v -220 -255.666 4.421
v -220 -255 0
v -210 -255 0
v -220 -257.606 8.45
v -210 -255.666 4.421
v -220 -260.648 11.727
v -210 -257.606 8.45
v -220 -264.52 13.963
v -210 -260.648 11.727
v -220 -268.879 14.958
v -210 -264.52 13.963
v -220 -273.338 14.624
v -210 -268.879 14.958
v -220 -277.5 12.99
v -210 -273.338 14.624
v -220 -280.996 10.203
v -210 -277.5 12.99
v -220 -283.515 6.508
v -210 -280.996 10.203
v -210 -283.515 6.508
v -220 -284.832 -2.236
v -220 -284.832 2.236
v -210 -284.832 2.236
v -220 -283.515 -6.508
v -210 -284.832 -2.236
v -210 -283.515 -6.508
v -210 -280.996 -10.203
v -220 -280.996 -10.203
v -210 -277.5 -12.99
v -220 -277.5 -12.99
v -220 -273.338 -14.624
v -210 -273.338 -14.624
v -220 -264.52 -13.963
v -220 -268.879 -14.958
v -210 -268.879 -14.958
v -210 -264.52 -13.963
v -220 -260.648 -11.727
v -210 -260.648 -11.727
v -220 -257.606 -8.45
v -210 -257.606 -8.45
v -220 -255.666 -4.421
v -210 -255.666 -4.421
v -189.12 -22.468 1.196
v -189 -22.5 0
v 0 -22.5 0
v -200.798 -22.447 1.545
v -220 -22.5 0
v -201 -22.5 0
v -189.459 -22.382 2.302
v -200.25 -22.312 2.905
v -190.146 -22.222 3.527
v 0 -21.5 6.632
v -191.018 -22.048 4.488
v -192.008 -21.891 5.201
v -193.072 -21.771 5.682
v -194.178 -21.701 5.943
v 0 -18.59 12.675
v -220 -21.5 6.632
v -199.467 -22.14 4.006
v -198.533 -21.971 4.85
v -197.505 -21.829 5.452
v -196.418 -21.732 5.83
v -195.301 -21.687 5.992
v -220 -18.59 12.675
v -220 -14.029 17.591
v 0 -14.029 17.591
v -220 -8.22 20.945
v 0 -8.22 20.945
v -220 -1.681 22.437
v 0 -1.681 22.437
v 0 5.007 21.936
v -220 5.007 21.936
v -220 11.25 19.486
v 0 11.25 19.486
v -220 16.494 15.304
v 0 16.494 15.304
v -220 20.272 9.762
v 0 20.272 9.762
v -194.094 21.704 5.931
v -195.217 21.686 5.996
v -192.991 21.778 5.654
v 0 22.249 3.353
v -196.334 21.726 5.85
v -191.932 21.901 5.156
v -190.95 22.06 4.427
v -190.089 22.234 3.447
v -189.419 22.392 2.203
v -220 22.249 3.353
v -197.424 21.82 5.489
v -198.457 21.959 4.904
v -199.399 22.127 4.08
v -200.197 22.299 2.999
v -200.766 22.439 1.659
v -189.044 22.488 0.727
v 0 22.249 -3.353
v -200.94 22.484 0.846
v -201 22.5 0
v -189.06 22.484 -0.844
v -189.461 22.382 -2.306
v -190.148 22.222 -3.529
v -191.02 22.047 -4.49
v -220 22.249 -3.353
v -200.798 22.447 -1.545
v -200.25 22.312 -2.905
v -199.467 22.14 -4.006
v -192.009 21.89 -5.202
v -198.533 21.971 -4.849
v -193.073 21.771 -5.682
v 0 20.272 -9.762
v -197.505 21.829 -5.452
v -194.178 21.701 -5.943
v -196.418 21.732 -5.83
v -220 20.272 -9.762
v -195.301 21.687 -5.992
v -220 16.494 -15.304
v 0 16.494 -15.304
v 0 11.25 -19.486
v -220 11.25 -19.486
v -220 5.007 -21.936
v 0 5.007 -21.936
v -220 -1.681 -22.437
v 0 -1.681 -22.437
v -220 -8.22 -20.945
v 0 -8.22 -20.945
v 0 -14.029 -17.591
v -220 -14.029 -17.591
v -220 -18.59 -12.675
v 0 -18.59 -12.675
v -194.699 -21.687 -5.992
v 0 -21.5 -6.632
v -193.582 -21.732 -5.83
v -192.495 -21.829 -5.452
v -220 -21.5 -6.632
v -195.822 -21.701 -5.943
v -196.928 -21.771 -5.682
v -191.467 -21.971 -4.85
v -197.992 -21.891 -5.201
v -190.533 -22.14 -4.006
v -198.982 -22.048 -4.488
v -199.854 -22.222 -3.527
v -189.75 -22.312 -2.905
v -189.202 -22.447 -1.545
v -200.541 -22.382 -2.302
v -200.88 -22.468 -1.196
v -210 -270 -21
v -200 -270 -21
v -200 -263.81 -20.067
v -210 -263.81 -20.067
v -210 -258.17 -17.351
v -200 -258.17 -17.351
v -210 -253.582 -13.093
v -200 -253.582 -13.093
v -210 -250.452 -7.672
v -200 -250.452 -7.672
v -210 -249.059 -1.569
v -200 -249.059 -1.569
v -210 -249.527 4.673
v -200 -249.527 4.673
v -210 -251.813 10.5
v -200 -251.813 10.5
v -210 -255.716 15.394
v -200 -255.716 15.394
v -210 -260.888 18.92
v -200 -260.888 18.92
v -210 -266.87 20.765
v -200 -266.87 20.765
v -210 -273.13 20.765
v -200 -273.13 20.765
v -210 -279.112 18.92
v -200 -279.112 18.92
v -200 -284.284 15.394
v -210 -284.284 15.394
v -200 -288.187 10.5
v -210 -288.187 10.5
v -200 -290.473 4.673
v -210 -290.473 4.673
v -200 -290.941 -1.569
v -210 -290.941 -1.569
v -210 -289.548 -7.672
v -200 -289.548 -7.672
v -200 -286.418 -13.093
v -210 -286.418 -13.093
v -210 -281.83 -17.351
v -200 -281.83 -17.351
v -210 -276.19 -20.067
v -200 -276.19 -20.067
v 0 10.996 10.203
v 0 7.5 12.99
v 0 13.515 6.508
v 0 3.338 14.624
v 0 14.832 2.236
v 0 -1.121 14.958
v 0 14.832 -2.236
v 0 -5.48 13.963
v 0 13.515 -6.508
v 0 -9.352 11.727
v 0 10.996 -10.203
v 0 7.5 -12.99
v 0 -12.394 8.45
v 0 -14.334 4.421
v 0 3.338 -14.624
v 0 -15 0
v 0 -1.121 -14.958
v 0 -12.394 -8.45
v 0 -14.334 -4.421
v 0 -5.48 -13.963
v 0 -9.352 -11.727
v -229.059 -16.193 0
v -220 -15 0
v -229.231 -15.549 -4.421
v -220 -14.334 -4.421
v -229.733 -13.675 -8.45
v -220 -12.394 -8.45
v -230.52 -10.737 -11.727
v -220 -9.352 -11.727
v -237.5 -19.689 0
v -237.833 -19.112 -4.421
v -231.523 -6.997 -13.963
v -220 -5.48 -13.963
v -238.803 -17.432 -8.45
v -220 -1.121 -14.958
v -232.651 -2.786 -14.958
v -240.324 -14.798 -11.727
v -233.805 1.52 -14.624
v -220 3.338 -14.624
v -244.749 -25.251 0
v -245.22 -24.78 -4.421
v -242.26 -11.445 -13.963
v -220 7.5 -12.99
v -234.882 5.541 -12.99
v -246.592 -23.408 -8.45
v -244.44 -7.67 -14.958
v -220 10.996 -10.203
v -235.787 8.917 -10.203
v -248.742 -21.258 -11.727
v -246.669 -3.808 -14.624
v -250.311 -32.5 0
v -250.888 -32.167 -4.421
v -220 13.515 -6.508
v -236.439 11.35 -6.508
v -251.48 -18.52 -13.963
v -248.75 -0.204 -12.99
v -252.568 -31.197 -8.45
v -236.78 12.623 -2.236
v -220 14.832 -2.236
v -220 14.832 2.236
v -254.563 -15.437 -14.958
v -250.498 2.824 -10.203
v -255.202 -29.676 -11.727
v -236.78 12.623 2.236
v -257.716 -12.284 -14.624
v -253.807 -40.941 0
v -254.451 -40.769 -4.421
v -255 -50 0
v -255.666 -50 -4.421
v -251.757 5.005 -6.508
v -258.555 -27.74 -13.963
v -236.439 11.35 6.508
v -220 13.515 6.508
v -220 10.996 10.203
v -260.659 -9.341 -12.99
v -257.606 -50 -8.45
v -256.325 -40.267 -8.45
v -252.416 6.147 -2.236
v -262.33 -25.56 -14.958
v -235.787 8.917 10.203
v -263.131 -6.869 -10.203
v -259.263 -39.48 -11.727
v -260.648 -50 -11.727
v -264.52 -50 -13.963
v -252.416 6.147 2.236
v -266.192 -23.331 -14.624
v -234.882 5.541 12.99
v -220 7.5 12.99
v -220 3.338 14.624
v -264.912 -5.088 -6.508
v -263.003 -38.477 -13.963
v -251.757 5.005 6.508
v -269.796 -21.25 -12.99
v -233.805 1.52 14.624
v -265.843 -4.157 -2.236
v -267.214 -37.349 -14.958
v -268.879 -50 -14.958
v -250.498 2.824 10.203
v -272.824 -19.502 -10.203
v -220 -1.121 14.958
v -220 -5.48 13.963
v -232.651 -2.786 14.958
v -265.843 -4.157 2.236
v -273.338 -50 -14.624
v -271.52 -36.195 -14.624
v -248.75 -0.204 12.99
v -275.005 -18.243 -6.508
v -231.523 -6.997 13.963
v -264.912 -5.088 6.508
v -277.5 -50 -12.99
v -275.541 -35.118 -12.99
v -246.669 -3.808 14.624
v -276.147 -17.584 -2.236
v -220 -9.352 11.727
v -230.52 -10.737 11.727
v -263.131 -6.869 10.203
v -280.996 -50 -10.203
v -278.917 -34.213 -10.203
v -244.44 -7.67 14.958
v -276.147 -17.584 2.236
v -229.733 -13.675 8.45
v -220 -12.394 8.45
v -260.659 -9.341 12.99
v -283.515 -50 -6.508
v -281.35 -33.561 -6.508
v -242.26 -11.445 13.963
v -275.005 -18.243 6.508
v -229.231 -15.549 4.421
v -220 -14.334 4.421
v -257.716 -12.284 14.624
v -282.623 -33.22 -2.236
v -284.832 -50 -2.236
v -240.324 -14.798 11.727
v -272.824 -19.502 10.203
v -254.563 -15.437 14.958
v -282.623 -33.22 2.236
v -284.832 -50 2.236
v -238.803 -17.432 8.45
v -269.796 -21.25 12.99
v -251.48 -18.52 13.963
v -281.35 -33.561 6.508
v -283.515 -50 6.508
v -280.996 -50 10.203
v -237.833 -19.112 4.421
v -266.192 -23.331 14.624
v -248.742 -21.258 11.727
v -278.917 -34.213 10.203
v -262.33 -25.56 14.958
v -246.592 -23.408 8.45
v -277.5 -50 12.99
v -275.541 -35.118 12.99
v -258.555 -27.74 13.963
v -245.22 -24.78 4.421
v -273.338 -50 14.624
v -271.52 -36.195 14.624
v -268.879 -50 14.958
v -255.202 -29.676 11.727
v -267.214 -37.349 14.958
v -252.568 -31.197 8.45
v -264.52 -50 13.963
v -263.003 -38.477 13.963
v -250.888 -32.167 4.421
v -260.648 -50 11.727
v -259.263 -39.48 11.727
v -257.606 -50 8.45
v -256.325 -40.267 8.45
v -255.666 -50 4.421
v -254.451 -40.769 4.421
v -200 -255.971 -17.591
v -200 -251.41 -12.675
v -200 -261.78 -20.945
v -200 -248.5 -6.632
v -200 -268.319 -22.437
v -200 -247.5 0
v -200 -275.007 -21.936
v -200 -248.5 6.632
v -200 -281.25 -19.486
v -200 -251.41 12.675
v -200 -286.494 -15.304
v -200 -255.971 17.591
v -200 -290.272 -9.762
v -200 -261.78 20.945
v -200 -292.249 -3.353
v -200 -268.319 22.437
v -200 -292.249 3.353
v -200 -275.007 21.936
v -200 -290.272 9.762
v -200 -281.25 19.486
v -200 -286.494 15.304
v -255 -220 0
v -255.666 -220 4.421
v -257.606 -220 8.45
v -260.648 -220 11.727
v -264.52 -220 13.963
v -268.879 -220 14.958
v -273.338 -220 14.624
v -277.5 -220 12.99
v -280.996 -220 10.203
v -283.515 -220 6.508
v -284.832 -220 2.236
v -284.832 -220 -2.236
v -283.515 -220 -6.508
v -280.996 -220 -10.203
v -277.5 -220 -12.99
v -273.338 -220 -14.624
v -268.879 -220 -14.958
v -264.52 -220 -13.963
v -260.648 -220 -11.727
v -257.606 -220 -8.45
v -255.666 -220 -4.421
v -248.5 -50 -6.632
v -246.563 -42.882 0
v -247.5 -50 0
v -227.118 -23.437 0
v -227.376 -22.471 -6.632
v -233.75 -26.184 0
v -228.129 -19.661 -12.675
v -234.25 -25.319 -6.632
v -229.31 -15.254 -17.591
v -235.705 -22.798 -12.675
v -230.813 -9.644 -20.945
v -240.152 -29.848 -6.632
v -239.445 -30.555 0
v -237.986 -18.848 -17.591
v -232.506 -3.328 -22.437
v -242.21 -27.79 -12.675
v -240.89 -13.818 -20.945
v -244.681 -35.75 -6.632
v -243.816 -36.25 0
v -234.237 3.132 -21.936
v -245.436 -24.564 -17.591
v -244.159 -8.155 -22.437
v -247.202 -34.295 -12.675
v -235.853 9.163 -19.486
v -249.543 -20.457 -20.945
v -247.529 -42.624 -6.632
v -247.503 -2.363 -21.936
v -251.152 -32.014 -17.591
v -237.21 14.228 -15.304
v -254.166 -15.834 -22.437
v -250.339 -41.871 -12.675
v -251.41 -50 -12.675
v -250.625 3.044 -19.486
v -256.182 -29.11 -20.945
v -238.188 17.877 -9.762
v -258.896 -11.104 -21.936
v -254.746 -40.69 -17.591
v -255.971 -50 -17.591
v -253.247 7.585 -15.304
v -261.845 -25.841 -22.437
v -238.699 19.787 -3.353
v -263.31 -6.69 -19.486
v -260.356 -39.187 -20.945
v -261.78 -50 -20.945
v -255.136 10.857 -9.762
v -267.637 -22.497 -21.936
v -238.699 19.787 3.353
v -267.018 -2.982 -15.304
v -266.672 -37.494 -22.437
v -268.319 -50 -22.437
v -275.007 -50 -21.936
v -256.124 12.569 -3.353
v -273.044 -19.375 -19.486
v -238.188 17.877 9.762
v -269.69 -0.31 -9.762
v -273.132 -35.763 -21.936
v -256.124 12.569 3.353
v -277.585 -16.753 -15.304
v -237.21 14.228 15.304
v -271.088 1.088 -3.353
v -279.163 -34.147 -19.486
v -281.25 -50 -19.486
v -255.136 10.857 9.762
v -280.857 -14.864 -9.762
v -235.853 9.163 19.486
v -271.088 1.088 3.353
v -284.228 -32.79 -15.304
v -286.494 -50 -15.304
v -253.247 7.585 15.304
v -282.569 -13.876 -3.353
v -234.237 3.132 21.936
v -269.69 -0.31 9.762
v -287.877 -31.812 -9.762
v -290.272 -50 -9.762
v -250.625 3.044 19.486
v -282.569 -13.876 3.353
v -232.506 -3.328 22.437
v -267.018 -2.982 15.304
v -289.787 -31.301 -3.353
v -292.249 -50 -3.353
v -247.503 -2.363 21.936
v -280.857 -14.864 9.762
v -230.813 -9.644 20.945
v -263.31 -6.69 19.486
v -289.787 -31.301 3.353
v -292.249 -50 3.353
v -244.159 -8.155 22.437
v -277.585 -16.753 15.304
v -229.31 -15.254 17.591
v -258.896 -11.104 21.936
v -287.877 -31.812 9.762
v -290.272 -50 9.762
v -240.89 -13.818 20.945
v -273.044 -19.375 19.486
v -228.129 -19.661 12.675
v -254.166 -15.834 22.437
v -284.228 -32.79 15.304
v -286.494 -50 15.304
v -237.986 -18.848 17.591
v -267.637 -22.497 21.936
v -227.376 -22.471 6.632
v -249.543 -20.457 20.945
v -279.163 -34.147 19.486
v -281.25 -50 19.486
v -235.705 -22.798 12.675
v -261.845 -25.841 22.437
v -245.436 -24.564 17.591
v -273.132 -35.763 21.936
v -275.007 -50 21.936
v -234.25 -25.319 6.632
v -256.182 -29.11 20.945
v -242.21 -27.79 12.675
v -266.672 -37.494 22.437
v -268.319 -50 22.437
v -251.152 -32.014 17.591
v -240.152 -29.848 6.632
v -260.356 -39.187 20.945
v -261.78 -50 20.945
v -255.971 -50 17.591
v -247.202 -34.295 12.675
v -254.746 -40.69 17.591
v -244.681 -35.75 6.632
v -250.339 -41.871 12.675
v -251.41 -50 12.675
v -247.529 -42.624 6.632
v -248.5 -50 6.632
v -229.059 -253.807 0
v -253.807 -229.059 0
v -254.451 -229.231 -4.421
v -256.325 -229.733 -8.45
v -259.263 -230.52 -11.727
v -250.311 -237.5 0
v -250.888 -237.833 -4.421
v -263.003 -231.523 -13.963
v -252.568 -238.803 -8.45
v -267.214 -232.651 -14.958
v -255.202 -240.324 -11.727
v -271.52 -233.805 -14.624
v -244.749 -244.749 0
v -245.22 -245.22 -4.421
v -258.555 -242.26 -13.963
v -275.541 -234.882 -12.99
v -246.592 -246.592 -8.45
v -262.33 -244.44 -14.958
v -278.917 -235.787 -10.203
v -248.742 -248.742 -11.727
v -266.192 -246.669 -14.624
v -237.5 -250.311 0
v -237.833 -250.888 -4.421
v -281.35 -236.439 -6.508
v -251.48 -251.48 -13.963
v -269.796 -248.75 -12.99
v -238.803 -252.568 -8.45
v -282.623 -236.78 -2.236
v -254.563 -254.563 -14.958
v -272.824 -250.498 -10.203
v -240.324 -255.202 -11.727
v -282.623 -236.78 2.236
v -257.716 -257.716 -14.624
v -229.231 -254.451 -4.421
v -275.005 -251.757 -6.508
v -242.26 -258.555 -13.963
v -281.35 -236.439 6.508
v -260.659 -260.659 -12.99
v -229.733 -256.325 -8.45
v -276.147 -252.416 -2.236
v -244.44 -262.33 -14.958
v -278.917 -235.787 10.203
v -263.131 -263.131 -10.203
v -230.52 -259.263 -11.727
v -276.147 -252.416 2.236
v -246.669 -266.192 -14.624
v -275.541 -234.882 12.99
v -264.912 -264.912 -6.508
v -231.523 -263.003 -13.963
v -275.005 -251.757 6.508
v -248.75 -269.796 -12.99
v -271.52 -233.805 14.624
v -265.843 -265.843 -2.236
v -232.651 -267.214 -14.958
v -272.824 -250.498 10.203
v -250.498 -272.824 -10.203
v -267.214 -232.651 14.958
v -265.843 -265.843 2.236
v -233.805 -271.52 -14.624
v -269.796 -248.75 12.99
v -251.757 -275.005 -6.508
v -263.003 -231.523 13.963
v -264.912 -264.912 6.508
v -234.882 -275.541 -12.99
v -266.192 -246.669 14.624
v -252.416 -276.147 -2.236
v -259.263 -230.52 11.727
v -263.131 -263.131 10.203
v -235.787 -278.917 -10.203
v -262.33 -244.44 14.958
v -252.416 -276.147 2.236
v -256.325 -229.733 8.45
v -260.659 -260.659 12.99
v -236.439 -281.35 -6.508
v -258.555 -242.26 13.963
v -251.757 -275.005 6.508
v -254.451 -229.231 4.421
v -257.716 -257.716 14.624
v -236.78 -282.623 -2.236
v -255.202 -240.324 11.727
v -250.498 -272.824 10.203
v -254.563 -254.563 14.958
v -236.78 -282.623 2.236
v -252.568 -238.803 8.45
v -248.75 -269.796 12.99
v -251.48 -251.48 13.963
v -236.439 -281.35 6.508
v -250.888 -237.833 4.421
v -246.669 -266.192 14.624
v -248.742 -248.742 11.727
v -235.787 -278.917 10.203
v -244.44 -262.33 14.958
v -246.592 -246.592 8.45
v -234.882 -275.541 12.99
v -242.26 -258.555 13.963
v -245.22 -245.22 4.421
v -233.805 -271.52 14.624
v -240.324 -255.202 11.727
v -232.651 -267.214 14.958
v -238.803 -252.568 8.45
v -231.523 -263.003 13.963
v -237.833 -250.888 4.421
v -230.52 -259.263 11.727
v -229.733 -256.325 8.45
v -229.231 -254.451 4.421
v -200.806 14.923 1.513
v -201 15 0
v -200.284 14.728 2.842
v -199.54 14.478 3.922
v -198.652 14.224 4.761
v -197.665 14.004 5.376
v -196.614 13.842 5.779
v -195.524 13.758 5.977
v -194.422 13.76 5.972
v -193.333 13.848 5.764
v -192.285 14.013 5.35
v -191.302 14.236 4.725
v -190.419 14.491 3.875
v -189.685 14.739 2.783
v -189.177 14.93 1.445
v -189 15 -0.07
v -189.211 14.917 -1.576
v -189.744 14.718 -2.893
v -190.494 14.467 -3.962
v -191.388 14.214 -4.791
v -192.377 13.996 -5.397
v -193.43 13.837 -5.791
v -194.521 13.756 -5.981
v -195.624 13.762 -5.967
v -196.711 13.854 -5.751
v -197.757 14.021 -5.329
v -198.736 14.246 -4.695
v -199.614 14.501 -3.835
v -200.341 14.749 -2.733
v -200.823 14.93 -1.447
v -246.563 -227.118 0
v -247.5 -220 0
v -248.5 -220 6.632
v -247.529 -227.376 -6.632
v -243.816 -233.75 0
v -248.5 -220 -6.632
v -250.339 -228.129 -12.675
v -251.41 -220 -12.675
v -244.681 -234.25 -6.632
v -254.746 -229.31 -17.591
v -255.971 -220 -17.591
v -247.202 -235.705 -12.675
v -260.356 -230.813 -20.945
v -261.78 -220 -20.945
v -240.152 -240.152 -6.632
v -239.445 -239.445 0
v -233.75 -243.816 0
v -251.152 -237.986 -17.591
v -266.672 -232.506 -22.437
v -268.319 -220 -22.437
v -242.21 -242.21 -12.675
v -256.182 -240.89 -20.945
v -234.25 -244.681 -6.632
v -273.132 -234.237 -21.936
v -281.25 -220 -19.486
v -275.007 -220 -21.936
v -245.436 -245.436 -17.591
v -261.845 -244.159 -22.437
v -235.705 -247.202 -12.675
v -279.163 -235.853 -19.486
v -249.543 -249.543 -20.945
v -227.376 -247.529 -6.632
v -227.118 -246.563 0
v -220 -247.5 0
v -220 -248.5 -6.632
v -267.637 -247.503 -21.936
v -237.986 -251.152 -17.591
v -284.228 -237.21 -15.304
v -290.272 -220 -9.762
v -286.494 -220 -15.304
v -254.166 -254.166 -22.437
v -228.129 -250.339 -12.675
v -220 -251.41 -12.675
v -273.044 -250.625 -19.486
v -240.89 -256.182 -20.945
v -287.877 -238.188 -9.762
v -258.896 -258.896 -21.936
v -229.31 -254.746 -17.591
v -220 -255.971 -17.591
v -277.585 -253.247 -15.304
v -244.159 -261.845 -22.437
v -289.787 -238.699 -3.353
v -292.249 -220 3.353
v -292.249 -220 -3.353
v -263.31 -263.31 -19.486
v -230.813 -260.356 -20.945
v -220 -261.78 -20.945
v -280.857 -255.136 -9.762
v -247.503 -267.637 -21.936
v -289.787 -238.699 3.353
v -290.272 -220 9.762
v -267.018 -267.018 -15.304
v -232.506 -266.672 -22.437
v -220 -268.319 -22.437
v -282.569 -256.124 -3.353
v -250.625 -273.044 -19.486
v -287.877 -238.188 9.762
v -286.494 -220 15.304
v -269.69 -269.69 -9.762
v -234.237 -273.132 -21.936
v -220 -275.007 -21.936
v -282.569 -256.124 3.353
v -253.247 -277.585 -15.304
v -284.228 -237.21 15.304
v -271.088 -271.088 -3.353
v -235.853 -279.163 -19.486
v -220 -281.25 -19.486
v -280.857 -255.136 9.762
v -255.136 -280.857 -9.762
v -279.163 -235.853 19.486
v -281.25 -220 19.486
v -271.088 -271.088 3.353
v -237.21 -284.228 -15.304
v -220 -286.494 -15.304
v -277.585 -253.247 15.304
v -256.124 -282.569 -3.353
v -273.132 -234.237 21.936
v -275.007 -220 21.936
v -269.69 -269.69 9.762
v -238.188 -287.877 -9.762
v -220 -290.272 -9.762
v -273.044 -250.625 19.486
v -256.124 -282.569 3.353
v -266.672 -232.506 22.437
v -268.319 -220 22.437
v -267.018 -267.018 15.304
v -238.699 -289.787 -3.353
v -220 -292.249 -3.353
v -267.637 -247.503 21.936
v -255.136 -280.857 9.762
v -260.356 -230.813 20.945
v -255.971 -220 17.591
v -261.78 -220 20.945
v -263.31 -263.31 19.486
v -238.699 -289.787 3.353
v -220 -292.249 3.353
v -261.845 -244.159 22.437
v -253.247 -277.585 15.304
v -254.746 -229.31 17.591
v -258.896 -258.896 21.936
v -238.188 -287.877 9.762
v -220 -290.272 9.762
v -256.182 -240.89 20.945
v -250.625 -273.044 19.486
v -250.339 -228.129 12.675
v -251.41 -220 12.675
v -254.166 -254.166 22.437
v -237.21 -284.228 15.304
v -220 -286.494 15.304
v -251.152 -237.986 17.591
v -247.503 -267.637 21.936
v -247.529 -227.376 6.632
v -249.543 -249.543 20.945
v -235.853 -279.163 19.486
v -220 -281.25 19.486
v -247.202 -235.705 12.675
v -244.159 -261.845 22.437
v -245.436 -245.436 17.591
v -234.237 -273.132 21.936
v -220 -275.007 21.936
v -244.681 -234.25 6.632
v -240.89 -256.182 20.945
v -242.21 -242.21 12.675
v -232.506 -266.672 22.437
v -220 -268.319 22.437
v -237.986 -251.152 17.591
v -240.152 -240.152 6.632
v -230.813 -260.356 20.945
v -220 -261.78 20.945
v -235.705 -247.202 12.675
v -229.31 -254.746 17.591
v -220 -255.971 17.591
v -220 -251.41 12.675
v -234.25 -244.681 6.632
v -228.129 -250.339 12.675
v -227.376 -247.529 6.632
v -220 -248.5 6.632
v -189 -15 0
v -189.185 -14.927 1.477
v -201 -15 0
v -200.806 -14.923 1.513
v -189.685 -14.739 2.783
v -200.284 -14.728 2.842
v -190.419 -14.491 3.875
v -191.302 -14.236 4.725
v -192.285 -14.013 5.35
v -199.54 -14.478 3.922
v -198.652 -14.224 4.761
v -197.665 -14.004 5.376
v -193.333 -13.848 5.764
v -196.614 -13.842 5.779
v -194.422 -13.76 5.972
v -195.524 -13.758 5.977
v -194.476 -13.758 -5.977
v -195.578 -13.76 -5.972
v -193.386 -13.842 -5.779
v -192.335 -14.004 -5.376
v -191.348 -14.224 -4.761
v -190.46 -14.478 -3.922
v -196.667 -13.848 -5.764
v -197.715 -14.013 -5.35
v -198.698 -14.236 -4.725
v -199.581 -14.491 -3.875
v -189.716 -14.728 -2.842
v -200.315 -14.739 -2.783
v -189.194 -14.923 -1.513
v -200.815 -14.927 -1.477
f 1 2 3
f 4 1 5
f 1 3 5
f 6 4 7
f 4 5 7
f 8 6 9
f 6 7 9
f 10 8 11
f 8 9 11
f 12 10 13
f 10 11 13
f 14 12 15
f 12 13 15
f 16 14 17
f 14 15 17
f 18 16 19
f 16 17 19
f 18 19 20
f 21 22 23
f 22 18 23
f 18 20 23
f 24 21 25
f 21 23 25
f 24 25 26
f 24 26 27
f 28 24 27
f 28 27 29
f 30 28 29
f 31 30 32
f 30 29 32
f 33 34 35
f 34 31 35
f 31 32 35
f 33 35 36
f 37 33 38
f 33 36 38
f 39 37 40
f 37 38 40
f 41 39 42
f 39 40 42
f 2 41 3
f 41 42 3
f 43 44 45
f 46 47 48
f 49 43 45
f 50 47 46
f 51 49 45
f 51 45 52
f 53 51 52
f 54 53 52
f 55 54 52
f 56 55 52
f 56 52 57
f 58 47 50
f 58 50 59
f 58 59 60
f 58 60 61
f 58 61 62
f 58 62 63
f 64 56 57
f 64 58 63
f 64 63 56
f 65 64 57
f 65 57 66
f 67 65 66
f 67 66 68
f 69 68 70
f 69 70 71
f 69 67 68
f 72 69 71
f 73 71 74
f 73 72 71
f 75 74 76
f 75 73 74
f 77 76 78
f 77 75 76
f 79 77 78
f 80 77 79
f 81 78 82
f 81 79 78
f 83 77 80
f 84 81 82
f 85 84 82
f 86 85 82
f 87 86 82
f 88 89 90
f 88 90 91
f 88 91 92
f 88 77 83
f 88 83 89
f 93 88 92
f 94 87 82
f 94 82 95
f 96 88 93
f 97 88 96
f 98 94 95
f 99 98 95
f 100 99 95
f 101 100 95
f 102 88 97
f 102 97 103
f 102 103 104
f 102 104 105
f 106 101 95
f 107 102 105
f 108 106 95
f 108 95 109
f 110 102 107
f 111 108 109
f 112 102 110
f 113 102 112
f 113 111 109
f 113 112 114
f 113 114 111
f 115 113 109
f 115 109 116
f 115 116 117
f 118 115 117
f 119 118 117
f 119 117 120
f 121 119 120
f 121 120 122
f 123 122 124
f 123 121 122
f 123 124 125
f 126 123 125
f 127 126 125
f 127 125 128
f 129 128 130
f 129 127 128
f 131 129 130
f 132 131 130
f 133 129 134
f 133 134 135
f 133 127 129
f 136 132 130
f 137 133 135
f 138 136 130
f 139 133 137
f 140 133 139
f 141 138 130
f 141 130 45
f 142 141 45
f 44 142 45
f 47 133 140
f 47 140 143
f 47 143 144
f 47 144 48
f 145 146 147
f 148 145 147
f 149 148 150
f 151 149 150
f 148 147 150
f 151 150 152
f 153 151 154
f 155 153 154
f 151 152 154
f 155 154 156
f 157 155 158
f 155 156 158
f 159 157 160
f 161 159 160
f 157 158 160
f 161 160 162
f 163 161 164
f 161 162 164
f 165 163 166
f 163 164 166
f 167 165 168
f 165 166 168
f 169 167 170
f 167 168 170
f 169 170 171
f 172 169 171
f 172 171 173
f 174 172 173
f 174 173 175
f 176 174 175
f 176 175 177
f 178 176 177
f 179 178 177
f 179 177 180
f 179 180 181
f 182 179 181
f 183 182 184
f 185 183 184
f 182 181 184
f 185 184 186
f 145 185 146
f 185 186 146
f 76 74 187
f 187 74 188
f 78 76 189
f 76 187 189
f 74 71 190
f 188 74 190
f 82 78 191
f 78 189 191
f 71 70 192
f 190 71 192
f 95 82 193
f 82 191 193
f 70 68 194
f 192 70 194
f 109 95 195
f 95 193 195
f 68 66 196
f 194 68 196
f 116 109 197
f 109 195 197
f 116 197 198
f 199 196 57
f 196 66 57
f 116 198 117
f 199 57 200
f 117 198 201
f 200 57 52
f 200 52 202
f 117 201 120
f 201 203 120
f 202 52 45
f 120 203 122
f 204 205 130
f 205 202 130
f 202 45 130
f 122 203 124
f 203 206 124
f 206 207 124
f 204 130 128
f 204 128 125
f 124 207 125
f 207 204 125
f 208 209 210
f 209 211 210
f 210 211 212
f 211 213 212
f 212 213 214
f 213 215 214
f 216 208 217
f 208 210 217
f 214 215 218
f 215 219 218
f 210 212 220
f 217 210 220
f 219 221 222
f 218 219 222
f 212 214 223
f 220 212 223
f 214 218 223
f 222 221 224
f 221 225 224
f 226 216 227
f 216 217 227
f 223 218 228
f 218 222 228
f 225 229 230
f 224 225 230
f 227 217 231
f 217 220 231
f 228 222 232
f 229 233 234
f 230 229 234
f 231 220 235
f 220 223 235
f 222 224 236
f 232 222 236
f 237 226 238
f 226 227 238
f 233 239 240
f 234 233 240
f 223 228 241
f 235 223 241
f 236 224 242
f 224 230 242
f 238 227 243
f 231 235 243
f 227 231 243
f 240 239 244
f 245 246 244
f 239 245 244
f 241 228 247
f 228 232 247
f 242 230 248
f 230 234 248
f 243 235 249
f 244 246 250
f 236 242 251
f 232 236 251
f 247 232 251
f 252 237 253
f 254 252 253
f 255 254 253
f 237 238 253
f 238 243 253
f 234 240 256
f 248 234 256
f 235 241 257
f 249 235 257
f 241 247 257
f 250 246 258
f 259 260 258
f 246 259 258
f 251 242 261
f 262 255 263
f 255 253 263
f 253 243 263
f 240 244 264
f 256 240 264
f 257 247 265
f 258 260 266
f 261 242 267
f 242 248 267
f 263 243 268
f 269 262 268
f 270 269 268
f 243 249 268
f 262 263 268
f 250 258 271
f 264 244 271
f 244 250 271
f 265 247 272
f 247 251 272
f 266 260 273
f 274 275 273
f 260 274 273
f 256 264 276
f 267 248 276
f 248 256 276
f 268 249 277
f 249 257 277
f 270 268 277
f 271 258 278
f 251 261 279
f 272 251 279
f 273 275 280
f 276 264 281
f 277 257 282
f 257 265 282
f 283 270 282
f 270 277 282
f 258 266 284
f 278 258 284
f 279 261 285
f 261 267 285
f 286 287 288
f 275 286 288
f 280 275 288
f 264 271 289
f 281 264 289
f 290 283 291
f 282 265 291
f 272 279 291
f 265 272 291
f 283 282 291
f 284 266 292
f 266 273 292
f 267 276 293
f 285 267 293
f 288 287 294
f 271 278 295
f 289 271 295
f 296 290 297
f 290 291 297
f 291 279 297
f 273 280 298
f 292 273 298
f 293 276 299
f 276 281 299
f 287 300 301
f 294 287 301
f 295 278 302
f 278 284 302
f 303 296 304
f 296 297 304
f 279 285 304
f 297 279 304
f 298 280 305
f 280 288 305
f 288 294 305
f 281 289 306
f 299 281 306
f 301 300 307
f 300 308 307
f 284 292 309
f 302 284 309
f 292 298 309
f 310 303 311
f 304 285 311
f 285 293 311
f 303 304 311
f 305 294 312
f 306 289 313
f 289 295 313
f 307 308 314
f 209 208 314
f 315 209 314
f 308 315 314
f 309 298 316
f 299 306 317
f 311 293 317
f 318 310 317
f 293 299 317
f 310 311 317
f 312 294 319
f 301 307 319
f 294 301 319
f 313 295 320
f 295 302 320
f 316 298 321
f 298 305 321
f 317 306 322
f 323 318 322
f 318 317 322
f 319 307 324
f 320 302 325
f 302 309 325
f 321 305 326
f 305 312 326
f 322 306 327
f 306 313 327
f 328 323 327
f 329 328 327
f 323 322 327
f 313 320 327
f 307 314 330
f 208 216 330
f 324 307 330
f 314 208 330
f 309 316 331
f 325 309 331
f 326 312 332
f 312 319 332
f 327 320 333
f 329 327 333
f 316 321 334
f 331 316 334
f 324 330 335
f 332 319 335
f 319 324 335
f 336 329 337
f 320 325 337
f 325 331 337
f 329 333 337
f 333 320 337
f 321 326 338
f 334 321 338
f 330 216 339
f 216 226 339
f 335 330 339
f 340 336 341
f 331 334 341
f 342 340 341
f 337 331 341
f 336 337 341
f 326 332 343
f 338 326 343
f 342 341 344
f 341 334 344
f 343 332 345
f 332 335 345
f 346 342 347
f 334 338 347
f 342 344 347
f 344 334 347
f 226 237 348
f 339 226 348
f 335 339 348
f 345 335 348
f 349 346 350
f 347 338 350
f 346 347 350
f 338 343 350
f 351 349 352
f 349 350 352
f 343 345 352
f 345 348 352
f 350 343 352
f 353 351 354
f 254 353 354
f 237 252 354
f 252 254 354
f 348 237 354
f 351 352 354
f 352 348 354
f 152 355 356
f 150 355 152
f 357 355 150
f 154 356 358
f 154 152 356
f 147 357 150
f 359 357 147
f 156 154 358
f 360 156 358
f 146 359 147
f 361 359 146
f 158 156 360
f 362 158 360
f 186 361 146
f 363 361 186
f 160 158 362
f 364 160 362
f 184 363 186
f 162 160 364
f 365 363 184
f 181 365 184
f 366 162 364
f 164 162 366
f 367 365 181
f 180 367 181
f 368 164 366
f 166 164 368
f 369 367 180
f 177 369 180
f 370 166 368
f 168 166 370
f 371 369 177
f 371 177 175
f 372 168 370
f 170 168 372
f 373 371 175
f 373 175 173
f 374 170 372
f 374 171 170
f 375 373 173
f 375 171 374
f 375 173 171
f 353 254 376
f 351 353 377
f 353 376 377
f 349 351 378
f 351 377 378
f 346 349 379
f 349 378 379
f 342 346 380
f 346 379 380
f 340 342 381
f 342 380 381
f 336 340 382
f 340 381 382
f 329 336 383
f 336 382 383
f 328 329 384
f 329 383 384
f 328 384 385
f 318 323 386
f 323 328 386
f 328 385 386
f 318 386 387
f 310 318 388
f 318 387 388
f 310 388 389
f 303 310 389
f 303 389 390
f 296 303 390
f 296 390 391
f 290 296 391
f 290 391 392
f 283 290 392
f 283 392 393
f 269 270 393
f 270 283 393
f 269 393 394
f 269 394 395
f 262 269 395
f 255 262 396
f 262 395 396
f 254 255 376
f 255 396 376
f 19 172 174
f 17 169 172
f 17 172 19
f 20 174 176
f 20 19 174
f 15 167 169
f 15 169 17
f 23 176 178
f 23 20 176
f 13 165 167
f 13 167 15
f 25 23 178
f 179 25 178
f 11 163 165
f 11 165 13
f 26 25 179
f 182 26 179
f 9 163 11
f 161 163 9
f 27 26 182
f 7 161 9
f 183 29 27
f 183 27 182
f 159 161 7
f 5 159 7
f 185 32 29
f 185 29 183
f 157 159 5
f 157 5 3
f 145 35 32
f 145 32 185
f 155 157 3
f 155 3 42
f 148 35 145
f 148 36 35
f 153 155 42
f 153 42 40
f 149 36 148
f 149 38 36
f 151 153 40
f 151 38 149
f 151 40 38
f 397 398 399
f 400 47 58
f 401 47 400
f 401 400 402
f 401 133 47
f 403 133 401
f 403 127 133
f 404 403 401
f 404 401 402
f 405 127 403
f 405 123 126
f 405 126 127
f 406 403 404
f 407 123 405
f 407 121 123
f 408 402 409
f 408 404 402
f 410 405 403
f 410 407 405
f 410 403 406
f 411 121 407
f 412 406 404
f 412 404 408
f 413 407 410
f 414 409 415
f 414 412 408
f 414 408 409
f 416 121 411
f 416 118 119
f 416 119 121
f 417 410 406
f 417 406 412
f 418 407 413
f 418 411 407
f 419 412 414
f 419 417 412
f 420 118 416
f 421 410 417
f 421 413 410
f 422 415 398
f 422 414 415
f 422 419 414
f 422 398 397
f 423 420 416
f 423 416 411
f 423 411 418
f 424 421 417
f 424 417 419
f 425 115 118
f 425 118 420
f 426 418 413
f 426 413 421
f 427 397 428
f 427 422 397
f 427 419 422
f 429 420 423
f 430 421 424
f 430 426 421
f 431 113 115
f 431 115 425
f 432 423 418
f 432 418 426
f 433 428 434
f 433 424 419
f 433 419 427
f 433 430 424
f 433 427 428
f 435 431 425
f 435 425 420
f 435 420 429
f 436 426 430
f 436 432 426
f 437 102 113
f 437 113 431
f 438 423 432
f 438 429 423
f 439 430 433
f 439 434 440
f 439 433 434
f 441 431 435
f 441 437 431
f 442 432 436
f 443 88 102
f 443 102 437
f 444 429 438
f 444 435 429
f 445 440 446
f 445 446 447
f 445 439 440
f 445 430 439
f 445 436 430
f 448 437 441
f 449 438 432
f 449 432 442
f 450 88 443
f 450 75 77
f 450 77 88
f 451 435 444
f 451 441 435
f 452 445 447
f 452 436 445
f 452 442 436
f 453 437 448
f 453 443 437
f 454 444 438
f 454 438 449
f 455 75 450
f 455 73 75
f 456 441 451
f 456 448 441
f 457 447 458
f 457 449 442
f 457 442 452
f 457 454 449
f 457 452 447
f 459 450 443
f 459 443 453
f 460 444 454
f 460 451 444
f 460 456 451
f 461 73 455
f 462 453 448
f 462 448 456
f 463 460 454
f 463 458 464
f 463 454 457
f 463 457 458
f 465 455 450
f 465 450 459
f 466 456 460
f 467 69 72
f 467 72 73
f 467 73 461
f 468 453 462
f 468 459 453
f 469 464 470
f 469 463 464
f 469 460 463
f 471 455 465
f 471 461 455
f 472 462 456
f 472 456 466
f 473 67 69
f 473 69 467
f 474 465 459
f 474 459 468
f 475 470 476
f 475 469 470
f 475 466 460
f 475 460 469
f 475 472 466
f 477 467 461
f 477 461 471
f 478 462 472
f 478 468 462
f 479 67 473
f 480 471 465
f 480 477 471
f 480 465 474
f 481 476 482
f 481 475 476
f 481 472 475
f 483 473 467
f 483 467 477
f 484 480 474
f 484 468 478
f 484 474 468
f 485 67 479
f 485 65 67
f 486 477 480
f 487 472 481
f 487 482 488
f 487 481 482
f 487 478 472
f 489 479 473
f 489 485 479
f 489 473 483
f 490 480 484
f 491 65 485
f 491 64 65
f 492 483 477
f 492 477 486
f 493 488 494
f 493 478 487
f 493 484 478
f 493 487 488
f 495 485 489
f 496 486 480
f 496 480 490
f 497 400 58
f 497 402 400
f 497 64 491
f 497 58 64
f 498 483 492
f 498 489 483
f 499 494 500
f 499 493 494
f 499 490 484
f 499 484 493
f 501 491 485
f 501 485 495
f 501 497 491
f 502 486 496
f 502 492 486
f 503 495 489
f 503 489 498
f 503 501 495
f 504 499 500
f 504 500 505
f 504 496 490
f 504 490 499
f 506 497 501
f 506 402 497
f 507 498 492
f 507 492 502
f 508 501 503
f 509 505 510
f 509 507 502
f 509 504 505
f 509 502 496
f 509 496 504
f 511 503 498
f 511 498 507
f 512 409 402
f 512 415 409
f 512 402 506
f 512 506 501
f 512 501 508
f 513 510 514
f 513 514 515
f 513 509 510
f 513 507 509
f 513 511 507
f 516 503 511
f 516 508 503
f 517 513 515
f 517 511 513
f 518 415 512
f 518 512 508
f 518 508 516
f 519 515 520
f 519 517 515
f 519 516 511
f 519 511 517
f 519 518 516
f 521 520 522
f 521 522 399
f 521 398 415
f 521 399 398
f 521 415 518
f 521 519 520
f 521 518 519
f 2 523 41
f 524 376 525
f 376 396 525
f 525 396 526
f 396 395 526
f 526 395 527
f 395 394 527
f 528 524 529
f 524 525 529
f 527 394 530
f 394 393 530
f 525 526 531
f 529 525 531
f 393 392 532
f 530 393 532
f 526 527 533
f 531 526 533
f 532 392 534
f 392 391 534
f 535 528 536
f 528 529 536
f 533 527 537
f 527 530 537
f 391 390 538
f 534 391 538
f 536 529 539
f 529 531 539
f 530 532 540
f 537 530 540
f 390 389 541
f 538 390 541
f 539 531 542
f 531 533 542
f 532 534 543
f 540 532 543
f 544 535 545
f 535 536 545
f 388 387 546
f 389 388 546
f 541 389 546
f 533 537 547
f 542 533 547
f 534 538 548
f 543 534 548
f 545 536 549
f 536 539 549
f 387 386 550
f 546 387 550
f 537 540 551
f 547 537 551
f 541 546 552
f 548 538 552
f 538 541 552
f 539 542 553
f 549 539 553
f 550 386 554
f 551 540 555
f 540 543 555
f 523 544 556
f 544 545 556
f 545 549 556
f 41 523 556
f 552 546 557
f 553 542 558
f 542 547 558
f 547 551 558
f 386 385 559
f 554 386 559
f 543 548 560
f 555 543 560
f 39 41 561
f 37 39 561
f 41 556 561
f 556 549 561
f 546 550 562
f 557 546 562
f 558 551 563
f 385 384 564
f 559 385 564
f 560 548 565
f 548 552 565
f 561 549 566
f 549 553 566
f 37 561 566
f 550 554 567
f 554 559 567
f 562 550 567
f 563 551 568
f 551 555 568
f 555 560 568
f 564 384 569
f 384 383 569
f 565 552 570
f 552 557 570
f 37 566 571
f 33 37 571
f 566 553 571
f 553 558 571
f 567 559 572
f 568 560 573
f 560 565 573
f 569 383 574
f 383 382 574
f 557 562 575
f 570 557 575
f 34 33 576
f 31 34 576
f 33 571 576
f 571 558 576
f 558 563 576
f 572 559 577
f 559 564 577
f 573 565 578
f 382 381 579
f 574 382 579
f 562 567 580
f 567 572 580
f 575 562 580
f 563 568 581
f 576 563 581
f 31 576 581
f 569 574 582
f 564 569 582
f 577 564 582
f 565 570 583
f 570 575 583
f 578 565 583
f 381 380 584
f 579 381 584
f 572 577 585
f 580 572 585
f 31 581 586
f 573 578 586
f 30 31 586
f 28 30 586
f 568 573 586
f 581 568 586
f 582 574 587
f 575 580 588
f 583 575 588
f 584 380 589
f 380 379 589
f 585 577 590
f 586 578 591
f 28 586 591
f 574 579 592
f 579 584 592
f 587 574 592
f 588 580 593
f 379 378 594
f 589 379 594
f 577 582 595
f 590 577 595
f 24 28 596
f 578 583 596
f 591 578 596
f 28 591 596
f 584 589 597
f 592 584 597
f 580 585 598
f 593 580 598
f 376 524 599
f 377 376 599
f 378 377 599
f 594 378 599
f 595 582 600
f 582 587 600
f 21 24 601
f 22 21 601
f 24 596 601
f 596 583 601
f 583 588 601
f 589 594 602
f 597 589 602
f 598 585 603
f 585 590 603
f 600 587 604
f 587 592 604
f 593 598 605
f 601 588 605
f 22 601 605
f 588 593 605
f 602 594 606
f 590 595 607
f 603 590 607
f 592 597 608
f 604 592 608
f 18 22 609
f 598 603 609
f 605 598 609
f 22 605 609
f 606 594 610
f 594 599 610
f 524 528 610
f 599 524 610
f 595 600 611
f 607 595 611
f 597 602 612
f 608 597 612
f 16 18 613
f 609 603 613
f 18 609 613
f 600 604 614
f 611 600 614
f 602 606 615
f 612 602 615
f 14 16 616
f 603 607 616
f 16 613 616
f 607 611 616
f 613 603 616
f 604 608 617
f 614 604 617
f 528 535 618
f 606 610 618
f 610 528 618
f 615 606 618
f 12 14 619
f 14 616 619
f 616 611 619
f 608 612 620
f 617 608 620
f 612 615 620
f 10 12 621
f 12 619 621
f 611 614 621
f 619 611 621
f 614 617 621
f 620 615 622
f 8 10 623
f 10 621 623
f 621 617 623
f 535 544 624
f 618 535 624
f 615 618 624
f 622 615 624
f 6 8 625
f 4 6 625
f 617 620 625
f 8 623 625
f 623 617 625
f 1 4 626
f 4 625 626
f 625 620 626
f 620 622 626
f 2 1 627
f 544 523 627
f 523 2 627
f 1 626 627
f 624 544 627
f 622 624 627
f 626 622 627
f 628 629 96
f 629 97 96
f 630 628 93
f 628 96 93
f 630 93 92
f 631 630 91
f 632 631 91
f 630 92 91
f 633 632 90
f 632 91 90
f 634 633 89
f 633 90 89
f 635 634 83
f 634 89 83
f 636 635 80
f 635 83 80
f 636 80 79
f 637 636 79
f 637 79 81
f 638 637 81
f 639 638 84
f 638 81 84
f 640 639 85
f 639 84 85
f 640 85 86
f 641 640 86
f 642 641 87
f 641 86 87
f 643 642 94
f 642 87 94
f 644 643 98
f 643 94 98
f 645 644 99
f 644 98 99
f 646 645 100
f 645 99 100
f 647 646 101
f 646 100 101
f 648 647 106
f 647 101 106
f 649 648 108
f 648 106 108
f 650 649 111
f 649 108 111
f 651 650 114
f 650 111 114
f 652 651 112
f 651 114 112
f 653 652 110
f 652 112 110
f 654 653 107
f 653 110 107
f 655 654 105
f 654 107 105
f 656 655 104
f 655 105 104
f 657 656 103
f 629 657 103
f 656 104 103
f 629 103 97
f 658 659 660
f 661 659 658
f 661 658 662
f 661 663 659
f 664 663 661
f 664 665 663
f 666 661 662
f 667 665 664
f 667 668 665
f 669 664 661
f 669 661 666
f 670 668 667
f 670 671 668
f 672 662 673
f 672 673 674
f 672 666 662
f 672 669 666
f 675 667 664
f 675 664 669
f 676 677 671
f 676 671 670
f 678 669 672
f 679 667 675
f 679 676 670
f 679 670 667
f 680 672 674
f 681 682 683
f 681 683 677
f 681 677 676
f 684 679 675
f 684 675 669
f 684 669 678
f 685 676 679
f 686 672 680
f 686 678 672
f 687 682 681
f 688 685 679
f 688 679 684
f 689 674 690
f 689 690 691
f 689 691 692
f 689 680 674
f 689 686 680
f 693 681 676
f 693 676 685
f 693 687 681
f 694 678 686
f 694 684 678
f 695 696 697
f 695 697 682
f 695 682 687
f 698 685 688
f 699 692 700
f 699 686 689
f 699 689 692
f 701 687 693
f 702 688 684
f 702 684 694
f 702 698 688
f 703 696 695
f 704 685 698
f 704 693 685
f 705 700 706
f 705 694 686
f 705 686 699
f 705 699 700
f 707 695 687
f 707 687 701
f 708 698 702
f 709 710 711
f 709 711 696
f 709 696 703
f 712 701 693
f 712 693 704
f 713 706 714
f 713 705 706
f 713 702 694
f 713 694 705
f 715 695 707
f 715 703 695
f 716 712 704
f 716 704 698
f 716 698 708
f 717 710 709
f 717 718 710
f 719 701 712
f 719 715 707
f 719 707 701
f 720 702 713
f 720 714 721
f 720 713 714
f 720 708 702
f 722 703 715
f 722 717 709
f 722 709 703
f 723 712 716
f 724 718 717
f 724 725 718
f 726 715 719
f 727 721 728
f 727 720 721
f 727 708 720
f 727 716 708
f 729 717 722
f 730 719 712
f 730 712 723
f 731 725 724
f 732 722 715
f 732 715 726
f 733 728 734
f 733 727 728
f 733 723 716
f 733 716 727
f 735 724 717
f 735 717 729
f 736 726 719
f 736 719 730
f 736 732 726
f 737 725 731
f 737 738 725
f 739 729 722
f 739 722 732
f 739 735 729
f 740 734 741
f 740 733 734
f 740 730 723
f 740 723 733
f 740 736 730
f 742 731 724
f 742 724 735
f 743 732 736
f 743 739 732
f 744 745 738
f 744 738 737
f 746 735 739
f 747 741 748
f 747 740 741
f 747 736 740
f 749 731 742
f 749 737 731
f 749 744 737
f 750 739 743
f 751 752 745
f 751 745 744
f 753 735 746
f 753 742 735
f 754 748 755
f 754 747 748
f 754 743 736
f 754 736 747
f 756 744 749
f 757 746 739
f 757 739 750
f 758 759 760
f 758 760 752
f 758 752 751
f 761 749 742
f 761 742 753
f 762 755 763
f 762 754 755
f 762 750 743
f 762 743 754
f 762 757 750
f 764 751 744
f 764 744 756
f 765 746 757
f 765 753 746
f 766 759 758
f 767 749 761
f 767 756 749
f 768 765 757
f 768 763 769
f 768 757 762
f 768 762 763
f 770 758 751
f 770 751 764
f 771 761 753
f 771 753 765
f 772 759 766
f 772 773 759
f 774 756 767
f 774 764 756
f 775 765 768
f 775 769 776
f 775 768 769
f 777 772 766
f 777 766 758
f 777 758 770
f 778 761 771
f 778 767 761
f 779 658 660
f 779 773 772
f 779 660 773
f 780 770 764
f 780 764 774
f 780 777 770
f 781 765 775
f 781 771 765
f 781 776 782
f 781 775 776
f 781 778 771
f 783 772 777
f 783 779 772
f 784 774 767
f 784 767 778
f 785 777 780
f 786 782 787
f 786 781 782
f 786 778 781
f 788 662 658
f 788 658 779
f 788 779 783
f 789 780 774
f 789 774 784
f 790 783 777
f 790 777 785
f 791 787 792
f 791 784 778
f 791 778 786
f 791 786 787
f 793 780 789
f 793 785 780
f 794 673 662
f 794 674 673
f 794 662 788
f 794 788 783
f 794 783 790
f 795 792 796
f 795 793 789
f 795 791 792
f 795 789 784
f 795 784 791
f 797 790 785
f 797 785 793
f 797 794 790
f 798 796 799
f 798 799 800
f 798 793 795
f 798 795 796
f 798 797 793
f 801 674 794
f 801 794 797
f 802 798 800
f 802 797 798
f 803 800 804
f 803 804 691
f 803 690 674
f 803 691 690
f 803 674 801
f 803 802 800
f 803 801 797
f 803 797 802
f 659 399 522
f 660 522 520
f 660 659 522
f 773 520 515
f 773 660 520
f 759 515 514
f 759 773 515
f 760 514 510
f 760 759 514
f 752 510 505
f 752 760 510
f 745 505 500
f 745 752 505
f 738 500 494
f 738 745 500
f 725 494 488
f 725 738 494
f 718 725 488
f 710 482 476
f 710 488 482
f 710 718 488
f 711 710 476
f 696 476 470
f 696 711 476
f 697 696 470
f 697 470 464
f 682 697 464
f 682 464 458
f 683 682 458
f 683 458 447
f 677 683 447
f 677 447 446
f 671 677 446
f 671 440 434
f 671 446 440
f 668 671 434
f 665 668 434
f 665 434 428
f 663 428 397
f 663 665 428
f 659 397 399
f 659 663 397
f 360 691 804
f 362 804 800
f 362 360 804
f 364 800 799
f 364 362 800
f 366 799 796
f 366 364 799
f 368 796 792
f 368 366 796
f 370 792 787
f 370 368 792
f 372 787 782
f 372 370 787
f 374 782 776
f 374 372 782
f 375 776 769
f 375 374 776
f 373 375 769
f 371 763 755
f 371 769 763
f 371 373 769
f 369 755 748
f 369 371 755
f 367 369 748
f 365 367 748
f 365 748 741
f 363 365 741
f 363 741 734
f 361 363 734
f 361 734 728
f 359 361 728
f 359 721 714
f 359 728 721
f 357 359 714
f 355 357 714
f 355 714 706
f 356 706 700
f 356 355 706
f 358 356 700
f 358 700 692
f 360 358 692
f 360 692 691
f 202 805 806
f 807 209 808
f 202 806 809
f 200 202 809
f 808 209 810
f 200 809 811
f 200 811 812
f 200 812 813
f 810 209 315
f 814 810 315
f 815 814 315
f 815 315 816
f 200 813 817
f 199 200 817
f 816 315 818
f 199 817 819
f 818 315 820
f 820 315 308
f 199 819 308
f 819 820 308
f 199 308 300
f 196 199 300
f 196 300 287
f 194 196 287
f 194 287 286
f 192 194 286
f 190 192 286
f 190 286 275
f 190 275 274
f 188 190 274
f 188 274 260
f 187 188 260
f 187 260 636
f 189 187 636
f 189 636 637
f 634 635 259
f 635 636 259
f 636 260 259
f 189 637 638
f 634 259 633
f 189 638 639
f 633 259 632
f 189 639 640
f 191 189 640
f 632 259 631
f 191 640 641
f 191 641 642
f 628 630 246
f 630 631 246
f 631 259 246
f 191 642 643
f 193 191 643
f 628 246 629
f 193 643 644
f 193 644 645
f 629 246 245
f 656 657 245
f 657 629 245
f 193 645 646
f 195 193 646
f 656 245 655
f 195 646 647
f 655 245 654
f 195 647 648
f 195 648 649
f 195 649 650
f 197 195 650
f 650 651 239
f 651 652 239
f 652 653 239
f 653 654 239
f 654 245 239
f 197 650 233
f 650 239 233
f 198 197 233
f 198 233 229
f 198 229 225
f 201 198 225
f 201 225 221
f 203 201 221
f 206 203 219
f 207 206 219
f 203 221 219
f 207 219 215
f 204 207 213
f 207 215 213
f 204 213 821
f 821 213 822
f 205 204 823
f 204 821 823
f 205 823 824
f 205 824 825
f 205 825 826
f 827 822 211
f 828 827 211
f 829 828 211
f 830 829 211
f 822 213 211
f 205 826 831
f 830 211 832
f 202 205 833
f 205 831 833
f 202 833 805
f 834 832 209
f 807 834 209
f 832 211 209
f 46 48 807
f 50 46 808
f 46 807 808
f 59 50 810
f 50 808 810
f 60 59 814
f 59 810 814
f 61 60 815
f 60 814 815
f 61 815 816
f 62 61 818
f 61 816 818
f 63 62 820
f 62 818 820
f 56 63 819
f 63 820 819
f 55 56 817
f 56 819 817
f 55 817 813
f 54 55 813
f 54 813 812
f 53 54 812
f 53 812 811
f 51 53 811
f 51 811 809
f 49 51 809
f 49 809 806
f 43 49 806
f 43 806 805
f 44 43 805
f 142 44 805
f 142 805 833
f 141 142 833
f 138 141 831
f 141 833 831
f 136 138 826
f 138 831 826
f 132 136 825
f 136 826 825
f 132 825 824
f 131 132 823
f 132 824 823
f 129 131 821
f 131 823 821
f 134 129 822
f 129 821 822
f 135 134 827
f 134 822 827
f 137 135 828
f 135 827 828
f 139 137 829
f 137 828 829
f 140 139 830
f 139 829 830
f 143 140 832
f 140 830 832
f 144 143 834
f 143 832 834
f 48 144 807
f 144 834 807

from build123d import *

# Parameters (mm, degrees)
SWEEP_THIN1_PROFILE_R   = 22.5
SWEEP_THIN1_PROFILE_R_2 = 15
SKETCH30_R              = 21
CUT_EXTRUDE1_DEPTH      = 10
SKETCH41_R              = 6
CUT_EXTRUDE3_DEPTH      = 90


with BuildPart() as part:
    # Sweep-Thin1: sweep along a path in Sketch1
    with BuildLine(Plane.XY) as sweep_thin1_path:
        Line((0, 0), (-220, 0))
        ThreePointArc((-220, 0), (-255.355339059, -14.644660941), (-270, -50))
        Line((-270, -50), (-270, -220))
        ThreePointArc((-270, -220), (-255.355339059, -255.355339059), (-220, -270))
        Line((-220, -270), (-200, -270))
    # Sweep-Thin1 profile (on start of the path) → Sweep-Thin1 (sweep)
    with BuildSketch(Plane(origin=(0, 0, 0), x_dir=(0, -1, 0), z_dir=(-1, 0, 0))):
        Circle(SWEEP_THIN1_PROFILE_R)
        Circle(SWEEP_THIN1_PROFILE_R_2, mode=Mode.SUBTRACT)
    sweep(path=sweep_thin1_path.line)

    # Sketch30 → Cut-Extrude1 (cut)
    with BuildSketch(Plane(origin=(-200, 0, 0), x_dir=(0, 0, -1), z_dir=(1, 0, 0))):
        with Locations((0, -270)):
            Circle(SKETCH30_R)
    extrude(amount=-CUT_EXTRUDE1_DEPTH, mode=Mode.SUBTRACT)

    # Sketch41 → Cut-Extrude3 (cut)
    with BuildSketch(Plane(origin=(0, 22.5, 0), x_dir=(1, 0, 0), z_dir=(0, 1, 0))):
        with Locations(Location((-195, 0, 0), (0, 0, 180))):
            Circle(SKETCH41_R)
    extrude(amount=-CUT_EXTRUDE3_DEPTH, mode=Mode.SUBTRACT)


solid = part.part
